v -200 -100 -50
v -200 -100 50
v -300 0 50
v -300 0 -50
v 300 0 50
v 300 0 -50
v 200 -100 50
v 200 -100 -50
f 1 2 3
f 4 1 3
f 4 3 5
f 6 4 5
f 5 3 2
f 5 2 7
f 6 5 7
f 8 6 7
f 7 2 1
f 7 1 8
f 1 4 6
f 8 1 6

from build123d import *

# Parameters (mm, degrees)
F0_W     = 600
F0_H     = 100
F1_DEPTH = 100
F3_DEPTH = 100.001
F4_DEPTH = 100.001


with BuildPart() as f1:
    # F0 (on Front) → F1 (new body)
    with BuildSketch(Plane.XZ):
        Rectangle(F0_W, F0_H)
    extrude(amount=F1_DEPTH)

    # F2 (on face) → F3 (cut, through all)
    with BuildSketch(Plane.XY.offset(50)):
        Polygon((-200, -100), (-300, 0), (-300, -100), align=None)
    extrude(amount=-F3_DEPTH, mode=Mode.SUBTRACT)

    # F2 (on face) → F4 (cut, through all)
    with BuildSketch(Plane.XY.offset(50)):
        Polygon((300, -100), (300, 0), (200, -100), align=None)
    extrude(amount=-F4_DEPTH, mode=Mode.SUBTRACT)


solid = f1.part
